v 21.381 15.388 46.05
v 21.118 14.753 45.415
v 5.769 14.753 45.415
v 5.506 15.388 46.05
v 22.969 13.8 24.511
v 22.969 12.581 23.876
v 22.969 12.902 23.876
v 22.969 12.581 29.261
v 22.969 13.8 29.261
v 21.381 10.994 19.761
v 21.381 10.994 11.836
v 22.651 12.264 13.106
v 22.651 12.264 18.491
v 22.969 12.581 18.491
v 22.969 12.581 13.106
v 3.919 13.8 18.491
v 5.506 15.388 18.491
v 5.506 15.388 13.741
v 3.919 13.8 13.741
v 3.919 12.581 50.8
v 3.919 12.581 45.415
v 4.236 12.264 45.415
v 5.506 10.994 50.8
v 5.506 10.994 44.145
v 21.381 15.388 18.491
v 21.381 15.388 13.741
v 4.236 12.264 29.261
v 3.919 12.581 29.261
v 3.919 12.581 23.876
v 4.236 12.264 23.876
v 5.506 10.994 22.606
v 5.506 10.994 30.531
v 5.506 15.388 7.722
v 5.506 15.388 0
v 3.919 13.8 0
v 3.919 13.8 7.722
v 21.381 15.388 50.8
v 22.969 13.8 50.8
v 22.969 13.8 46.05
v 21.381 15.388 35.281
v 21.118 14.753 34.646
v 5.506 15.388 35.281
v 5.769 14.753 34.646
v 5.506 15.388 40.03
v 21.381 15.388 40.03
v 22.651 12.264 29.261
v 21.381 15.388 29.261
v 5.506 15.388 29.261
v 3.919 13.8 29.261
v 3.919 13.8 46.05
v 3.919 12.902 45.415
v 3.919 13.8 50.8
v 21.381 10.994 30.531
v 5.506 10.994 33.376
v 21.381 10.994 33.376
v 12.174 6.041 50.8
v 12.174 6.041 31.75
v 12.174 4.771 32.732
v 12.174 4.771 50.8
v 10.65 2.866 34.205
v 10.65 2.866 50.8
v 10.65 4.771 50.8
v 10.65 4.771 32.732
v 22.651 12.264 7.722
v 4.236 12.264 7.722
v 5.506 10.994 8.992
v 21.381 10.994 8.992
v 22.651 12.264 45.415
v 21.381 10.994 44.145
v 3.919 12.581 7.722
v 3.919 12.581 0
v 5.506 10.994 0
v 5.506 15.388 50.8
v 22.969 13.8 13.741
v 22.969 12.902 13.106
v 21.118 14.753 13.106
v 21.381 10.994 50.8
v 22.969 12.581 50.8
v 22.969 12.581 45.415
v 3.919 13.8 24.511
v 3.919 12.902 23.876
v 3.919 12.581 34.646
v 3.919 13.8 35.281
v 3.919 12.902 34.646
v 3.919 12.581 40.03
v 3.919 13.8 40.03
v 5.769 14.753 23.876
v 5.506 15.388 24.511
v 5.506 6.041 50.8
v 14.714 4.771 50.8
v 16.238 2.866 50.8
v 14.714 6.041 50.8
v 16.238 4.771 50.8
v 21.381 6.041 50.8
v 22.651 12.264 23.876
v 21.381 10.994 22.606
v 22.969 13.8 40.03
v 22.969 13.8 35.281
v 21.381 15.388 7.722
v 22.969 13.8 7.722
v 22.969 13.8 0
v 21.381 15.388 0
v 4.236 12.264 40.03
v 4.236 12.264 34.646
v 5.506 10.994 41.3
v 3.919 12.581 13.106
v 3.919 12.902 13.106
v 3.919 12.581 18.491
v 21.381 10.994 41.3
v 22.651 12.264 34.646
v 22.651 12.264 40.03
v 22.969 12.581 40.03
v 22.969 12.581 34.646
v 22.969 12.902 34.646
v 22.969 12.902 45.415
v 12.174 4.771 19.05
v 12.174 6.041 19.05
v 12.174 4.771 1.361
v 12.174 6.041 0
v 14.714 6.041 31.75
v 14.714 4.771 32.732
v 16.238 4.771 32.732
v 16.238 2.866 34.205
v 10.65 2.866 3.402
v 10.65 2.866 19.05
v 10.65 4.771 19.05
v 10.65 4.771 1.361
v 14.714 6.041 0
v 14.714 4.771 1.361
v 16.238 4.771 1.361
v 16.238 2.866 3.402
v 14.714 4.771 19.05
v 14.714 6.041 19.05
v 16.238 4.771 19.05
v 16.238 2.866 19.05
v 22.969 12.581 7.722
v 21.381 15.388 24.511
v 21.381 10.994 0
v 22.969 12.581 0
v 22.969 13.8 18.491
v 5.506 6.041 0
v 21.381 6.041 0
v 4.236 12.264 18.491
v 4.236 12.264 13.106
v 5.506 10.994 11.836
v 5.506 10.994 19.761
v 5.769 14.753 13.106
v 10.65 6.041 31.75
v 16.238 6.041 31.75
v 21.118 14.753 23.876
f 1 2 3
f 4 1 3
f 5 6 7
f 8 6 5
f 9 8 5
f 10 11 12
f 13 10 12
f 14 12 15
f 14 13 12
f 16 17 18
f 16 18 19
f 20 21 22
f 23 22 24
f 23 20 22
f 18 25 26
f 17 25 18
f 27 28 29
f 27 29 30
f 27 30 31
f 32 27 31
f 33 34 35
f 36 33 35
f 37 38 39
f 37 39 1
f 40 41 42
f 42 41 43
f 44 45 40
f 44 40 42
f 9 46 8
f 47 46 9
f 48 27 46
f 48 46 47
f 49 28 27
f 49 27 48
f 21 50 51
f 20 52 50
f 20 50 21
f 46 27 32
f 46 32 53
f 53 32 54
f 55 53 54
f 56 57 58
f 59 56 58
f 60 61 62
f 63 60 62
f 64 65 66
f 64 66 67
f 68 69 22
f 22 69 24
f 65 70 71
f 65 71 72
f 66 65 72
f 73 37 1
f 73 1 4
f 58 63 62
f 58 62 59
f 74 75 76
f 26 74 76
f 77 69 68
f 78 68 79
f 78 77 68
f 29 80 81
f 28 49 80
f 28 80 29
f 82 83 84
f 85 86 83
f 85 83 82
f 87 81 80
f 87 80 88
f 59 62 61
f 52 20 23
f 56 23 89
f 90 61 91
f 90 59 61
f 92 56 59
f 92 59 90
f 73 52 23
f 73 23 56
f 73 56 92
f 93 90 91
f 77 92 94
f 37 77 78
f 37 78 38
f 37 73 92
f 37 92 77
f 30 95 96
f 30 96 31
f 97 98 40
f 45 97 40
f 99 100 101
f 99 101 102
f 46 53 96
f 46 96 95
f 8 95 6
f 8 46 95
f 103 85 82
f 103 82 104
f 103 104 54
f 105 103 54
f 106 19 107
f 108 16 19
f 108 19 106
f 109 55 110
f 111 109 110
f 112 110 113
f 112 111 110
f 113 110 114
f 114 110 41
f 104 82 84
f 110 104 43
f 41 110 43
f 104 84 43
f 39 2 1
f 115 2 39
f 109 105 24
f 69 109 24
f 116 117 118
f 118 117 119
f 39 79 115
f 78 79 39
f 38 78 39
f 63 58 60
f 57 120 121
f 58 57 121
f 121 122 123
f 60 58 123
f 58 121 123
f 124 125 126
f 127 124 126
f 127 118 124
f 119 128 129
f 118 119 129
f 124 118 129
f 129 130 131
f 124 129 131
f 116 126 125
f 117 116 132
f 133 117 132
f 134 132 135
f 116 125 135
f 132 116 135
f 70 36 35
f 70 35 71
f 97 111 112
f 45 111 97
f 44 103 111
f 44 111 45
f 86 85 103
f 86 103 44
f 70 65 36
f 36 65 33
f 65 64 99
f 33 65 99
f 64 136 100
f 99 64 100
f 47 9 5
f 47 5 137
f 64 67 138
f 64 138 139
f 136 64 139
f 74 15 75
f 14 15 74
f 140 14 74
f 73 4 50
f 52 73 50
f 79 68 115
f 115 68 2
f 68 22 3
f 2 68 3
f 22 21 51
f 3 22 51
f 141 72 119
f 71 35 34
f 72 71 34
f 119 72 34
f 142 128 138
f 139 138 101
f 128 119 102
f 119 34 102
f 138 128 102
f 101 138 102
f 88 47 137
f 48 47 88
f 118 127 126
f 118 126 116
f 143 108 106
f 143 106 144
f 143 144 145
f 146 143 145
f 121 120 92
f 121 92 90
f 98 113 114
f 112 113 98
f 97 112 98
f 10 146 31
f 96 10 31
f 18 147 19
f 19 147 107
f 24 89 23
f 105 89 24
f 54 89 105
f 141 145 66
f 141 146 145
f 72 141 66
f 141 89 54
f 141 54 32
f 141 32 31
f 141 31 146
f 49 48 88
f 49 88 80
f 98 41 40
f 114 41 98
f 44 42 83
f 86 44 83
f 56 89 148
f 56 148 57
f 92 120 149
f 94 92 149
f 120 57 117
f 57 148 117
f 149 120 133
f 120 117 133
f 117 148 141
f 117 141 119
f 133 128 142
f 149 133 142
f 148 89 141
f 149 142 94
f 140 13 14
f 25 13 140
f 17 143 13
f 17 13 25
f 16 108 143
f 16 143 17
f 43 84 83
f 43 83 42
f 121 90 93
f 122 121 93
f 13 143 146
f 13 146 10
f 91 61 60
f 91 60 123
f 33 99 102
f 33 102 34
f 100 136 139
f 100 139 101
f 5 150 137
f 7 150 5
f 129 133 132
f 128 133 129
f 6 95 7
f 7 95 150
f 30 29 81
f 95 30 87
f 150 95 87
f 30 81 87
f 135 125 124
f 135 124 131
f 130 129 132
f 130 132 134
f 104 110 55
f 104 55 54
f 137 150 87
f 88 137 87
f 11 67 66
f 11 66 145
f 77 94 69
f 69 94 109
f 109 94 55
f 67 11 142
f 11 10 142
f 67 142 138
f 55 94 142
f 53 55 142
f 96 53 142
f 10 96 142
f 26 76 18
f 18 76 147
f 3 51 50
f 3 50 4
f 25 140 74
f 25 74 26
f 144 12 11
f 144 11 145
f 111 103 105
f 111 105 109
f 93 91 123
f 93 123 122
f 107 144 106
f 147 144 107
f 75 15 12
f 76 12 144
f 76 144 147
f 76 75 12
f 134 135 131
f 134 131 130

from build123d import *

# Parameters (mm, degrees)
F0_W      = 15.875
F0_H      = 4.953
F1_DEPTH  = 50.8
F3_DEPTH  = 50.8
F4_W      = 5.588
F4_H      = 3.175
F5_DEPTH  = 50.8
F6_W      = 5.588
F6_H      = 12.7
F7_DEPTH  = 3.175
F8_W      = 1.524
F8_H      = 1.27
F9_DEPTH  = 50.801
F11_DEPTH = 5.588
F12_W     = 4.3942
F12_H     = 5.3848
F13_DEPTH = 25.4
F14_SIZE  = 1.27
F15_SIZE  = 0.635


with BuildPart() as f1:
    # F0 (on Top) → F1 (new body)
    with BuildSketch(Plane.XY):
        with Locations((13.4436743471, 8.5170986131)):
            Rectangle(F0_W, F0_H)
    extrude(amount=F1_DEPTH)

    # F2 (on face) → F3 (join)
    with BuildSketch(Plane.XY.offset(50.8)):
        Polygon((3.9186743471, 12.5810986131), (5.5061743471, 10.9935986131), (21.3811743471, 10.9935986131), (22.9686743471, 12.5810986131), (22.9686743471, 13.8002986131), (21.3811743471, 15.3877986131), (5.5061743471, 15.3877986131), (3.9186743471, 13.8002986131), align=None)
    extrude(amount=-F3_DEPTH)

    # F4 (on face) → F5 (join, through all)
    with BuildSketch(Plane.XY.offset(50.8)):
        with Locations((13.4436743471, 4.4530986131)):
            Rectangle(F4_W, F4_H)
    extrude(amount=-F5_DEPTH)

    # F6 (on face) → F7 (cut, through all)
    with BuildSketch(Plane.XZ.offset(-2.8655986131)):
        with Locations((13.4436743471, 25.4)):
            Rectangle(F6_W, F6_H)
    extrude(amount=-F7_DEPTH, mode=Mode.SUBTRACT)

    # F8 (on face) → F9 (cut, through all)
    with BuildSketch(Plane(origin=(0, 0, 0), x_dir=(1, 0, 0), z_dir=(0, 0, -1))):
        with Locations((15.4756743471, -5.4055986131)):
            Rectangle(F8_W, F8_H)
        with Locations((11.4116743471, -5.4055986131)):
            Rectangle(F8_W, F8_H)
    extrude(amount=-F9_DEPTH, mode=Mode.SUBTRACT)

    # F10 (on face) → F11 (cut, through all)
    with BuildSketch(Plane.YZ.offset(16.2376743471)):
        Polygon((6.0405986131, 0), (2.8655986131, 3.4018158913), (2.8655986131, 0), align=None)
        Polygon((6.0405986131, 31.75), (2.8655986131, 34.2048890889), (2.8655986131, 31.75), align=None)
    extrude(amount=-F11_DEPTH, mode=Mode.SUBTRACT)

    # F12 (on face) → F13 (cut, symmetric)
    with BuildSketch(Plane.YZ.offset(21.3811743471)):
        with Locations((13.1906986131, 42.7228)):
            Rectangle(F12_W, F12_H)
        with Locations((13.1906986131, 31.9532)):
            Rectangle(F12_W, F12_H)
        with Locations((13.1906986131, 21.1836)):
            Rectangle(F12_W, F12_H)
        with Locations((13.1906986131, 10.414)):
            Rectangle(F12_W, F12_H)
    extrude(amount=F13_DEPTH, both=True, mode=Mode.SUBTRACT)

    # F14
    f14_edges = [f1.edges().sort_by_distance(p)[0] for p in [
        (13.443674, 10.993599, 7.7216),
        (13.443674, 10.993599, 13.1064),
        (13.443674, 10.993599, 18.4912),
        (13.443674, 10.993599, 23.876),
        (13.443674, 10.993599, 29.2608),
        (13.443674, 10.993599, 34.6456),
        (13.443674, 10.993599, 40.0304),
        (13.443674, 10.993599, 45.4152),
    ]]
    chamfer(f14_edges, length=F14_SIZE)

    # F15
    f15_edges = [f1.edges().sort_by_distance(p)[0] for p in [
        (13.443674, 15.387799, 34.6456),
        (13.443674, 15.387799, 23.876),
        (13.443674, 15.387799, 13.1064),
        (13.443674, 15.387799, 45.4152),
        (22.174924, 14.594049, 45.4152),
        (22.174924, 14.594049, 34.6456),
        (22.174924, 14.594049, 23.876),
        (22.174924, 14.594049, 13.1064),
        (4.712424, 14.594049, 13.1064),
        (4.712424, 14.594049, 23.876),
        (4.712424, 14.594049, 34.6456),
        (4.712424, 14.594049, 45.4152),
    ]]
    chamfer(f15_edges, length=F15_SIZE)


solid = f1.part
